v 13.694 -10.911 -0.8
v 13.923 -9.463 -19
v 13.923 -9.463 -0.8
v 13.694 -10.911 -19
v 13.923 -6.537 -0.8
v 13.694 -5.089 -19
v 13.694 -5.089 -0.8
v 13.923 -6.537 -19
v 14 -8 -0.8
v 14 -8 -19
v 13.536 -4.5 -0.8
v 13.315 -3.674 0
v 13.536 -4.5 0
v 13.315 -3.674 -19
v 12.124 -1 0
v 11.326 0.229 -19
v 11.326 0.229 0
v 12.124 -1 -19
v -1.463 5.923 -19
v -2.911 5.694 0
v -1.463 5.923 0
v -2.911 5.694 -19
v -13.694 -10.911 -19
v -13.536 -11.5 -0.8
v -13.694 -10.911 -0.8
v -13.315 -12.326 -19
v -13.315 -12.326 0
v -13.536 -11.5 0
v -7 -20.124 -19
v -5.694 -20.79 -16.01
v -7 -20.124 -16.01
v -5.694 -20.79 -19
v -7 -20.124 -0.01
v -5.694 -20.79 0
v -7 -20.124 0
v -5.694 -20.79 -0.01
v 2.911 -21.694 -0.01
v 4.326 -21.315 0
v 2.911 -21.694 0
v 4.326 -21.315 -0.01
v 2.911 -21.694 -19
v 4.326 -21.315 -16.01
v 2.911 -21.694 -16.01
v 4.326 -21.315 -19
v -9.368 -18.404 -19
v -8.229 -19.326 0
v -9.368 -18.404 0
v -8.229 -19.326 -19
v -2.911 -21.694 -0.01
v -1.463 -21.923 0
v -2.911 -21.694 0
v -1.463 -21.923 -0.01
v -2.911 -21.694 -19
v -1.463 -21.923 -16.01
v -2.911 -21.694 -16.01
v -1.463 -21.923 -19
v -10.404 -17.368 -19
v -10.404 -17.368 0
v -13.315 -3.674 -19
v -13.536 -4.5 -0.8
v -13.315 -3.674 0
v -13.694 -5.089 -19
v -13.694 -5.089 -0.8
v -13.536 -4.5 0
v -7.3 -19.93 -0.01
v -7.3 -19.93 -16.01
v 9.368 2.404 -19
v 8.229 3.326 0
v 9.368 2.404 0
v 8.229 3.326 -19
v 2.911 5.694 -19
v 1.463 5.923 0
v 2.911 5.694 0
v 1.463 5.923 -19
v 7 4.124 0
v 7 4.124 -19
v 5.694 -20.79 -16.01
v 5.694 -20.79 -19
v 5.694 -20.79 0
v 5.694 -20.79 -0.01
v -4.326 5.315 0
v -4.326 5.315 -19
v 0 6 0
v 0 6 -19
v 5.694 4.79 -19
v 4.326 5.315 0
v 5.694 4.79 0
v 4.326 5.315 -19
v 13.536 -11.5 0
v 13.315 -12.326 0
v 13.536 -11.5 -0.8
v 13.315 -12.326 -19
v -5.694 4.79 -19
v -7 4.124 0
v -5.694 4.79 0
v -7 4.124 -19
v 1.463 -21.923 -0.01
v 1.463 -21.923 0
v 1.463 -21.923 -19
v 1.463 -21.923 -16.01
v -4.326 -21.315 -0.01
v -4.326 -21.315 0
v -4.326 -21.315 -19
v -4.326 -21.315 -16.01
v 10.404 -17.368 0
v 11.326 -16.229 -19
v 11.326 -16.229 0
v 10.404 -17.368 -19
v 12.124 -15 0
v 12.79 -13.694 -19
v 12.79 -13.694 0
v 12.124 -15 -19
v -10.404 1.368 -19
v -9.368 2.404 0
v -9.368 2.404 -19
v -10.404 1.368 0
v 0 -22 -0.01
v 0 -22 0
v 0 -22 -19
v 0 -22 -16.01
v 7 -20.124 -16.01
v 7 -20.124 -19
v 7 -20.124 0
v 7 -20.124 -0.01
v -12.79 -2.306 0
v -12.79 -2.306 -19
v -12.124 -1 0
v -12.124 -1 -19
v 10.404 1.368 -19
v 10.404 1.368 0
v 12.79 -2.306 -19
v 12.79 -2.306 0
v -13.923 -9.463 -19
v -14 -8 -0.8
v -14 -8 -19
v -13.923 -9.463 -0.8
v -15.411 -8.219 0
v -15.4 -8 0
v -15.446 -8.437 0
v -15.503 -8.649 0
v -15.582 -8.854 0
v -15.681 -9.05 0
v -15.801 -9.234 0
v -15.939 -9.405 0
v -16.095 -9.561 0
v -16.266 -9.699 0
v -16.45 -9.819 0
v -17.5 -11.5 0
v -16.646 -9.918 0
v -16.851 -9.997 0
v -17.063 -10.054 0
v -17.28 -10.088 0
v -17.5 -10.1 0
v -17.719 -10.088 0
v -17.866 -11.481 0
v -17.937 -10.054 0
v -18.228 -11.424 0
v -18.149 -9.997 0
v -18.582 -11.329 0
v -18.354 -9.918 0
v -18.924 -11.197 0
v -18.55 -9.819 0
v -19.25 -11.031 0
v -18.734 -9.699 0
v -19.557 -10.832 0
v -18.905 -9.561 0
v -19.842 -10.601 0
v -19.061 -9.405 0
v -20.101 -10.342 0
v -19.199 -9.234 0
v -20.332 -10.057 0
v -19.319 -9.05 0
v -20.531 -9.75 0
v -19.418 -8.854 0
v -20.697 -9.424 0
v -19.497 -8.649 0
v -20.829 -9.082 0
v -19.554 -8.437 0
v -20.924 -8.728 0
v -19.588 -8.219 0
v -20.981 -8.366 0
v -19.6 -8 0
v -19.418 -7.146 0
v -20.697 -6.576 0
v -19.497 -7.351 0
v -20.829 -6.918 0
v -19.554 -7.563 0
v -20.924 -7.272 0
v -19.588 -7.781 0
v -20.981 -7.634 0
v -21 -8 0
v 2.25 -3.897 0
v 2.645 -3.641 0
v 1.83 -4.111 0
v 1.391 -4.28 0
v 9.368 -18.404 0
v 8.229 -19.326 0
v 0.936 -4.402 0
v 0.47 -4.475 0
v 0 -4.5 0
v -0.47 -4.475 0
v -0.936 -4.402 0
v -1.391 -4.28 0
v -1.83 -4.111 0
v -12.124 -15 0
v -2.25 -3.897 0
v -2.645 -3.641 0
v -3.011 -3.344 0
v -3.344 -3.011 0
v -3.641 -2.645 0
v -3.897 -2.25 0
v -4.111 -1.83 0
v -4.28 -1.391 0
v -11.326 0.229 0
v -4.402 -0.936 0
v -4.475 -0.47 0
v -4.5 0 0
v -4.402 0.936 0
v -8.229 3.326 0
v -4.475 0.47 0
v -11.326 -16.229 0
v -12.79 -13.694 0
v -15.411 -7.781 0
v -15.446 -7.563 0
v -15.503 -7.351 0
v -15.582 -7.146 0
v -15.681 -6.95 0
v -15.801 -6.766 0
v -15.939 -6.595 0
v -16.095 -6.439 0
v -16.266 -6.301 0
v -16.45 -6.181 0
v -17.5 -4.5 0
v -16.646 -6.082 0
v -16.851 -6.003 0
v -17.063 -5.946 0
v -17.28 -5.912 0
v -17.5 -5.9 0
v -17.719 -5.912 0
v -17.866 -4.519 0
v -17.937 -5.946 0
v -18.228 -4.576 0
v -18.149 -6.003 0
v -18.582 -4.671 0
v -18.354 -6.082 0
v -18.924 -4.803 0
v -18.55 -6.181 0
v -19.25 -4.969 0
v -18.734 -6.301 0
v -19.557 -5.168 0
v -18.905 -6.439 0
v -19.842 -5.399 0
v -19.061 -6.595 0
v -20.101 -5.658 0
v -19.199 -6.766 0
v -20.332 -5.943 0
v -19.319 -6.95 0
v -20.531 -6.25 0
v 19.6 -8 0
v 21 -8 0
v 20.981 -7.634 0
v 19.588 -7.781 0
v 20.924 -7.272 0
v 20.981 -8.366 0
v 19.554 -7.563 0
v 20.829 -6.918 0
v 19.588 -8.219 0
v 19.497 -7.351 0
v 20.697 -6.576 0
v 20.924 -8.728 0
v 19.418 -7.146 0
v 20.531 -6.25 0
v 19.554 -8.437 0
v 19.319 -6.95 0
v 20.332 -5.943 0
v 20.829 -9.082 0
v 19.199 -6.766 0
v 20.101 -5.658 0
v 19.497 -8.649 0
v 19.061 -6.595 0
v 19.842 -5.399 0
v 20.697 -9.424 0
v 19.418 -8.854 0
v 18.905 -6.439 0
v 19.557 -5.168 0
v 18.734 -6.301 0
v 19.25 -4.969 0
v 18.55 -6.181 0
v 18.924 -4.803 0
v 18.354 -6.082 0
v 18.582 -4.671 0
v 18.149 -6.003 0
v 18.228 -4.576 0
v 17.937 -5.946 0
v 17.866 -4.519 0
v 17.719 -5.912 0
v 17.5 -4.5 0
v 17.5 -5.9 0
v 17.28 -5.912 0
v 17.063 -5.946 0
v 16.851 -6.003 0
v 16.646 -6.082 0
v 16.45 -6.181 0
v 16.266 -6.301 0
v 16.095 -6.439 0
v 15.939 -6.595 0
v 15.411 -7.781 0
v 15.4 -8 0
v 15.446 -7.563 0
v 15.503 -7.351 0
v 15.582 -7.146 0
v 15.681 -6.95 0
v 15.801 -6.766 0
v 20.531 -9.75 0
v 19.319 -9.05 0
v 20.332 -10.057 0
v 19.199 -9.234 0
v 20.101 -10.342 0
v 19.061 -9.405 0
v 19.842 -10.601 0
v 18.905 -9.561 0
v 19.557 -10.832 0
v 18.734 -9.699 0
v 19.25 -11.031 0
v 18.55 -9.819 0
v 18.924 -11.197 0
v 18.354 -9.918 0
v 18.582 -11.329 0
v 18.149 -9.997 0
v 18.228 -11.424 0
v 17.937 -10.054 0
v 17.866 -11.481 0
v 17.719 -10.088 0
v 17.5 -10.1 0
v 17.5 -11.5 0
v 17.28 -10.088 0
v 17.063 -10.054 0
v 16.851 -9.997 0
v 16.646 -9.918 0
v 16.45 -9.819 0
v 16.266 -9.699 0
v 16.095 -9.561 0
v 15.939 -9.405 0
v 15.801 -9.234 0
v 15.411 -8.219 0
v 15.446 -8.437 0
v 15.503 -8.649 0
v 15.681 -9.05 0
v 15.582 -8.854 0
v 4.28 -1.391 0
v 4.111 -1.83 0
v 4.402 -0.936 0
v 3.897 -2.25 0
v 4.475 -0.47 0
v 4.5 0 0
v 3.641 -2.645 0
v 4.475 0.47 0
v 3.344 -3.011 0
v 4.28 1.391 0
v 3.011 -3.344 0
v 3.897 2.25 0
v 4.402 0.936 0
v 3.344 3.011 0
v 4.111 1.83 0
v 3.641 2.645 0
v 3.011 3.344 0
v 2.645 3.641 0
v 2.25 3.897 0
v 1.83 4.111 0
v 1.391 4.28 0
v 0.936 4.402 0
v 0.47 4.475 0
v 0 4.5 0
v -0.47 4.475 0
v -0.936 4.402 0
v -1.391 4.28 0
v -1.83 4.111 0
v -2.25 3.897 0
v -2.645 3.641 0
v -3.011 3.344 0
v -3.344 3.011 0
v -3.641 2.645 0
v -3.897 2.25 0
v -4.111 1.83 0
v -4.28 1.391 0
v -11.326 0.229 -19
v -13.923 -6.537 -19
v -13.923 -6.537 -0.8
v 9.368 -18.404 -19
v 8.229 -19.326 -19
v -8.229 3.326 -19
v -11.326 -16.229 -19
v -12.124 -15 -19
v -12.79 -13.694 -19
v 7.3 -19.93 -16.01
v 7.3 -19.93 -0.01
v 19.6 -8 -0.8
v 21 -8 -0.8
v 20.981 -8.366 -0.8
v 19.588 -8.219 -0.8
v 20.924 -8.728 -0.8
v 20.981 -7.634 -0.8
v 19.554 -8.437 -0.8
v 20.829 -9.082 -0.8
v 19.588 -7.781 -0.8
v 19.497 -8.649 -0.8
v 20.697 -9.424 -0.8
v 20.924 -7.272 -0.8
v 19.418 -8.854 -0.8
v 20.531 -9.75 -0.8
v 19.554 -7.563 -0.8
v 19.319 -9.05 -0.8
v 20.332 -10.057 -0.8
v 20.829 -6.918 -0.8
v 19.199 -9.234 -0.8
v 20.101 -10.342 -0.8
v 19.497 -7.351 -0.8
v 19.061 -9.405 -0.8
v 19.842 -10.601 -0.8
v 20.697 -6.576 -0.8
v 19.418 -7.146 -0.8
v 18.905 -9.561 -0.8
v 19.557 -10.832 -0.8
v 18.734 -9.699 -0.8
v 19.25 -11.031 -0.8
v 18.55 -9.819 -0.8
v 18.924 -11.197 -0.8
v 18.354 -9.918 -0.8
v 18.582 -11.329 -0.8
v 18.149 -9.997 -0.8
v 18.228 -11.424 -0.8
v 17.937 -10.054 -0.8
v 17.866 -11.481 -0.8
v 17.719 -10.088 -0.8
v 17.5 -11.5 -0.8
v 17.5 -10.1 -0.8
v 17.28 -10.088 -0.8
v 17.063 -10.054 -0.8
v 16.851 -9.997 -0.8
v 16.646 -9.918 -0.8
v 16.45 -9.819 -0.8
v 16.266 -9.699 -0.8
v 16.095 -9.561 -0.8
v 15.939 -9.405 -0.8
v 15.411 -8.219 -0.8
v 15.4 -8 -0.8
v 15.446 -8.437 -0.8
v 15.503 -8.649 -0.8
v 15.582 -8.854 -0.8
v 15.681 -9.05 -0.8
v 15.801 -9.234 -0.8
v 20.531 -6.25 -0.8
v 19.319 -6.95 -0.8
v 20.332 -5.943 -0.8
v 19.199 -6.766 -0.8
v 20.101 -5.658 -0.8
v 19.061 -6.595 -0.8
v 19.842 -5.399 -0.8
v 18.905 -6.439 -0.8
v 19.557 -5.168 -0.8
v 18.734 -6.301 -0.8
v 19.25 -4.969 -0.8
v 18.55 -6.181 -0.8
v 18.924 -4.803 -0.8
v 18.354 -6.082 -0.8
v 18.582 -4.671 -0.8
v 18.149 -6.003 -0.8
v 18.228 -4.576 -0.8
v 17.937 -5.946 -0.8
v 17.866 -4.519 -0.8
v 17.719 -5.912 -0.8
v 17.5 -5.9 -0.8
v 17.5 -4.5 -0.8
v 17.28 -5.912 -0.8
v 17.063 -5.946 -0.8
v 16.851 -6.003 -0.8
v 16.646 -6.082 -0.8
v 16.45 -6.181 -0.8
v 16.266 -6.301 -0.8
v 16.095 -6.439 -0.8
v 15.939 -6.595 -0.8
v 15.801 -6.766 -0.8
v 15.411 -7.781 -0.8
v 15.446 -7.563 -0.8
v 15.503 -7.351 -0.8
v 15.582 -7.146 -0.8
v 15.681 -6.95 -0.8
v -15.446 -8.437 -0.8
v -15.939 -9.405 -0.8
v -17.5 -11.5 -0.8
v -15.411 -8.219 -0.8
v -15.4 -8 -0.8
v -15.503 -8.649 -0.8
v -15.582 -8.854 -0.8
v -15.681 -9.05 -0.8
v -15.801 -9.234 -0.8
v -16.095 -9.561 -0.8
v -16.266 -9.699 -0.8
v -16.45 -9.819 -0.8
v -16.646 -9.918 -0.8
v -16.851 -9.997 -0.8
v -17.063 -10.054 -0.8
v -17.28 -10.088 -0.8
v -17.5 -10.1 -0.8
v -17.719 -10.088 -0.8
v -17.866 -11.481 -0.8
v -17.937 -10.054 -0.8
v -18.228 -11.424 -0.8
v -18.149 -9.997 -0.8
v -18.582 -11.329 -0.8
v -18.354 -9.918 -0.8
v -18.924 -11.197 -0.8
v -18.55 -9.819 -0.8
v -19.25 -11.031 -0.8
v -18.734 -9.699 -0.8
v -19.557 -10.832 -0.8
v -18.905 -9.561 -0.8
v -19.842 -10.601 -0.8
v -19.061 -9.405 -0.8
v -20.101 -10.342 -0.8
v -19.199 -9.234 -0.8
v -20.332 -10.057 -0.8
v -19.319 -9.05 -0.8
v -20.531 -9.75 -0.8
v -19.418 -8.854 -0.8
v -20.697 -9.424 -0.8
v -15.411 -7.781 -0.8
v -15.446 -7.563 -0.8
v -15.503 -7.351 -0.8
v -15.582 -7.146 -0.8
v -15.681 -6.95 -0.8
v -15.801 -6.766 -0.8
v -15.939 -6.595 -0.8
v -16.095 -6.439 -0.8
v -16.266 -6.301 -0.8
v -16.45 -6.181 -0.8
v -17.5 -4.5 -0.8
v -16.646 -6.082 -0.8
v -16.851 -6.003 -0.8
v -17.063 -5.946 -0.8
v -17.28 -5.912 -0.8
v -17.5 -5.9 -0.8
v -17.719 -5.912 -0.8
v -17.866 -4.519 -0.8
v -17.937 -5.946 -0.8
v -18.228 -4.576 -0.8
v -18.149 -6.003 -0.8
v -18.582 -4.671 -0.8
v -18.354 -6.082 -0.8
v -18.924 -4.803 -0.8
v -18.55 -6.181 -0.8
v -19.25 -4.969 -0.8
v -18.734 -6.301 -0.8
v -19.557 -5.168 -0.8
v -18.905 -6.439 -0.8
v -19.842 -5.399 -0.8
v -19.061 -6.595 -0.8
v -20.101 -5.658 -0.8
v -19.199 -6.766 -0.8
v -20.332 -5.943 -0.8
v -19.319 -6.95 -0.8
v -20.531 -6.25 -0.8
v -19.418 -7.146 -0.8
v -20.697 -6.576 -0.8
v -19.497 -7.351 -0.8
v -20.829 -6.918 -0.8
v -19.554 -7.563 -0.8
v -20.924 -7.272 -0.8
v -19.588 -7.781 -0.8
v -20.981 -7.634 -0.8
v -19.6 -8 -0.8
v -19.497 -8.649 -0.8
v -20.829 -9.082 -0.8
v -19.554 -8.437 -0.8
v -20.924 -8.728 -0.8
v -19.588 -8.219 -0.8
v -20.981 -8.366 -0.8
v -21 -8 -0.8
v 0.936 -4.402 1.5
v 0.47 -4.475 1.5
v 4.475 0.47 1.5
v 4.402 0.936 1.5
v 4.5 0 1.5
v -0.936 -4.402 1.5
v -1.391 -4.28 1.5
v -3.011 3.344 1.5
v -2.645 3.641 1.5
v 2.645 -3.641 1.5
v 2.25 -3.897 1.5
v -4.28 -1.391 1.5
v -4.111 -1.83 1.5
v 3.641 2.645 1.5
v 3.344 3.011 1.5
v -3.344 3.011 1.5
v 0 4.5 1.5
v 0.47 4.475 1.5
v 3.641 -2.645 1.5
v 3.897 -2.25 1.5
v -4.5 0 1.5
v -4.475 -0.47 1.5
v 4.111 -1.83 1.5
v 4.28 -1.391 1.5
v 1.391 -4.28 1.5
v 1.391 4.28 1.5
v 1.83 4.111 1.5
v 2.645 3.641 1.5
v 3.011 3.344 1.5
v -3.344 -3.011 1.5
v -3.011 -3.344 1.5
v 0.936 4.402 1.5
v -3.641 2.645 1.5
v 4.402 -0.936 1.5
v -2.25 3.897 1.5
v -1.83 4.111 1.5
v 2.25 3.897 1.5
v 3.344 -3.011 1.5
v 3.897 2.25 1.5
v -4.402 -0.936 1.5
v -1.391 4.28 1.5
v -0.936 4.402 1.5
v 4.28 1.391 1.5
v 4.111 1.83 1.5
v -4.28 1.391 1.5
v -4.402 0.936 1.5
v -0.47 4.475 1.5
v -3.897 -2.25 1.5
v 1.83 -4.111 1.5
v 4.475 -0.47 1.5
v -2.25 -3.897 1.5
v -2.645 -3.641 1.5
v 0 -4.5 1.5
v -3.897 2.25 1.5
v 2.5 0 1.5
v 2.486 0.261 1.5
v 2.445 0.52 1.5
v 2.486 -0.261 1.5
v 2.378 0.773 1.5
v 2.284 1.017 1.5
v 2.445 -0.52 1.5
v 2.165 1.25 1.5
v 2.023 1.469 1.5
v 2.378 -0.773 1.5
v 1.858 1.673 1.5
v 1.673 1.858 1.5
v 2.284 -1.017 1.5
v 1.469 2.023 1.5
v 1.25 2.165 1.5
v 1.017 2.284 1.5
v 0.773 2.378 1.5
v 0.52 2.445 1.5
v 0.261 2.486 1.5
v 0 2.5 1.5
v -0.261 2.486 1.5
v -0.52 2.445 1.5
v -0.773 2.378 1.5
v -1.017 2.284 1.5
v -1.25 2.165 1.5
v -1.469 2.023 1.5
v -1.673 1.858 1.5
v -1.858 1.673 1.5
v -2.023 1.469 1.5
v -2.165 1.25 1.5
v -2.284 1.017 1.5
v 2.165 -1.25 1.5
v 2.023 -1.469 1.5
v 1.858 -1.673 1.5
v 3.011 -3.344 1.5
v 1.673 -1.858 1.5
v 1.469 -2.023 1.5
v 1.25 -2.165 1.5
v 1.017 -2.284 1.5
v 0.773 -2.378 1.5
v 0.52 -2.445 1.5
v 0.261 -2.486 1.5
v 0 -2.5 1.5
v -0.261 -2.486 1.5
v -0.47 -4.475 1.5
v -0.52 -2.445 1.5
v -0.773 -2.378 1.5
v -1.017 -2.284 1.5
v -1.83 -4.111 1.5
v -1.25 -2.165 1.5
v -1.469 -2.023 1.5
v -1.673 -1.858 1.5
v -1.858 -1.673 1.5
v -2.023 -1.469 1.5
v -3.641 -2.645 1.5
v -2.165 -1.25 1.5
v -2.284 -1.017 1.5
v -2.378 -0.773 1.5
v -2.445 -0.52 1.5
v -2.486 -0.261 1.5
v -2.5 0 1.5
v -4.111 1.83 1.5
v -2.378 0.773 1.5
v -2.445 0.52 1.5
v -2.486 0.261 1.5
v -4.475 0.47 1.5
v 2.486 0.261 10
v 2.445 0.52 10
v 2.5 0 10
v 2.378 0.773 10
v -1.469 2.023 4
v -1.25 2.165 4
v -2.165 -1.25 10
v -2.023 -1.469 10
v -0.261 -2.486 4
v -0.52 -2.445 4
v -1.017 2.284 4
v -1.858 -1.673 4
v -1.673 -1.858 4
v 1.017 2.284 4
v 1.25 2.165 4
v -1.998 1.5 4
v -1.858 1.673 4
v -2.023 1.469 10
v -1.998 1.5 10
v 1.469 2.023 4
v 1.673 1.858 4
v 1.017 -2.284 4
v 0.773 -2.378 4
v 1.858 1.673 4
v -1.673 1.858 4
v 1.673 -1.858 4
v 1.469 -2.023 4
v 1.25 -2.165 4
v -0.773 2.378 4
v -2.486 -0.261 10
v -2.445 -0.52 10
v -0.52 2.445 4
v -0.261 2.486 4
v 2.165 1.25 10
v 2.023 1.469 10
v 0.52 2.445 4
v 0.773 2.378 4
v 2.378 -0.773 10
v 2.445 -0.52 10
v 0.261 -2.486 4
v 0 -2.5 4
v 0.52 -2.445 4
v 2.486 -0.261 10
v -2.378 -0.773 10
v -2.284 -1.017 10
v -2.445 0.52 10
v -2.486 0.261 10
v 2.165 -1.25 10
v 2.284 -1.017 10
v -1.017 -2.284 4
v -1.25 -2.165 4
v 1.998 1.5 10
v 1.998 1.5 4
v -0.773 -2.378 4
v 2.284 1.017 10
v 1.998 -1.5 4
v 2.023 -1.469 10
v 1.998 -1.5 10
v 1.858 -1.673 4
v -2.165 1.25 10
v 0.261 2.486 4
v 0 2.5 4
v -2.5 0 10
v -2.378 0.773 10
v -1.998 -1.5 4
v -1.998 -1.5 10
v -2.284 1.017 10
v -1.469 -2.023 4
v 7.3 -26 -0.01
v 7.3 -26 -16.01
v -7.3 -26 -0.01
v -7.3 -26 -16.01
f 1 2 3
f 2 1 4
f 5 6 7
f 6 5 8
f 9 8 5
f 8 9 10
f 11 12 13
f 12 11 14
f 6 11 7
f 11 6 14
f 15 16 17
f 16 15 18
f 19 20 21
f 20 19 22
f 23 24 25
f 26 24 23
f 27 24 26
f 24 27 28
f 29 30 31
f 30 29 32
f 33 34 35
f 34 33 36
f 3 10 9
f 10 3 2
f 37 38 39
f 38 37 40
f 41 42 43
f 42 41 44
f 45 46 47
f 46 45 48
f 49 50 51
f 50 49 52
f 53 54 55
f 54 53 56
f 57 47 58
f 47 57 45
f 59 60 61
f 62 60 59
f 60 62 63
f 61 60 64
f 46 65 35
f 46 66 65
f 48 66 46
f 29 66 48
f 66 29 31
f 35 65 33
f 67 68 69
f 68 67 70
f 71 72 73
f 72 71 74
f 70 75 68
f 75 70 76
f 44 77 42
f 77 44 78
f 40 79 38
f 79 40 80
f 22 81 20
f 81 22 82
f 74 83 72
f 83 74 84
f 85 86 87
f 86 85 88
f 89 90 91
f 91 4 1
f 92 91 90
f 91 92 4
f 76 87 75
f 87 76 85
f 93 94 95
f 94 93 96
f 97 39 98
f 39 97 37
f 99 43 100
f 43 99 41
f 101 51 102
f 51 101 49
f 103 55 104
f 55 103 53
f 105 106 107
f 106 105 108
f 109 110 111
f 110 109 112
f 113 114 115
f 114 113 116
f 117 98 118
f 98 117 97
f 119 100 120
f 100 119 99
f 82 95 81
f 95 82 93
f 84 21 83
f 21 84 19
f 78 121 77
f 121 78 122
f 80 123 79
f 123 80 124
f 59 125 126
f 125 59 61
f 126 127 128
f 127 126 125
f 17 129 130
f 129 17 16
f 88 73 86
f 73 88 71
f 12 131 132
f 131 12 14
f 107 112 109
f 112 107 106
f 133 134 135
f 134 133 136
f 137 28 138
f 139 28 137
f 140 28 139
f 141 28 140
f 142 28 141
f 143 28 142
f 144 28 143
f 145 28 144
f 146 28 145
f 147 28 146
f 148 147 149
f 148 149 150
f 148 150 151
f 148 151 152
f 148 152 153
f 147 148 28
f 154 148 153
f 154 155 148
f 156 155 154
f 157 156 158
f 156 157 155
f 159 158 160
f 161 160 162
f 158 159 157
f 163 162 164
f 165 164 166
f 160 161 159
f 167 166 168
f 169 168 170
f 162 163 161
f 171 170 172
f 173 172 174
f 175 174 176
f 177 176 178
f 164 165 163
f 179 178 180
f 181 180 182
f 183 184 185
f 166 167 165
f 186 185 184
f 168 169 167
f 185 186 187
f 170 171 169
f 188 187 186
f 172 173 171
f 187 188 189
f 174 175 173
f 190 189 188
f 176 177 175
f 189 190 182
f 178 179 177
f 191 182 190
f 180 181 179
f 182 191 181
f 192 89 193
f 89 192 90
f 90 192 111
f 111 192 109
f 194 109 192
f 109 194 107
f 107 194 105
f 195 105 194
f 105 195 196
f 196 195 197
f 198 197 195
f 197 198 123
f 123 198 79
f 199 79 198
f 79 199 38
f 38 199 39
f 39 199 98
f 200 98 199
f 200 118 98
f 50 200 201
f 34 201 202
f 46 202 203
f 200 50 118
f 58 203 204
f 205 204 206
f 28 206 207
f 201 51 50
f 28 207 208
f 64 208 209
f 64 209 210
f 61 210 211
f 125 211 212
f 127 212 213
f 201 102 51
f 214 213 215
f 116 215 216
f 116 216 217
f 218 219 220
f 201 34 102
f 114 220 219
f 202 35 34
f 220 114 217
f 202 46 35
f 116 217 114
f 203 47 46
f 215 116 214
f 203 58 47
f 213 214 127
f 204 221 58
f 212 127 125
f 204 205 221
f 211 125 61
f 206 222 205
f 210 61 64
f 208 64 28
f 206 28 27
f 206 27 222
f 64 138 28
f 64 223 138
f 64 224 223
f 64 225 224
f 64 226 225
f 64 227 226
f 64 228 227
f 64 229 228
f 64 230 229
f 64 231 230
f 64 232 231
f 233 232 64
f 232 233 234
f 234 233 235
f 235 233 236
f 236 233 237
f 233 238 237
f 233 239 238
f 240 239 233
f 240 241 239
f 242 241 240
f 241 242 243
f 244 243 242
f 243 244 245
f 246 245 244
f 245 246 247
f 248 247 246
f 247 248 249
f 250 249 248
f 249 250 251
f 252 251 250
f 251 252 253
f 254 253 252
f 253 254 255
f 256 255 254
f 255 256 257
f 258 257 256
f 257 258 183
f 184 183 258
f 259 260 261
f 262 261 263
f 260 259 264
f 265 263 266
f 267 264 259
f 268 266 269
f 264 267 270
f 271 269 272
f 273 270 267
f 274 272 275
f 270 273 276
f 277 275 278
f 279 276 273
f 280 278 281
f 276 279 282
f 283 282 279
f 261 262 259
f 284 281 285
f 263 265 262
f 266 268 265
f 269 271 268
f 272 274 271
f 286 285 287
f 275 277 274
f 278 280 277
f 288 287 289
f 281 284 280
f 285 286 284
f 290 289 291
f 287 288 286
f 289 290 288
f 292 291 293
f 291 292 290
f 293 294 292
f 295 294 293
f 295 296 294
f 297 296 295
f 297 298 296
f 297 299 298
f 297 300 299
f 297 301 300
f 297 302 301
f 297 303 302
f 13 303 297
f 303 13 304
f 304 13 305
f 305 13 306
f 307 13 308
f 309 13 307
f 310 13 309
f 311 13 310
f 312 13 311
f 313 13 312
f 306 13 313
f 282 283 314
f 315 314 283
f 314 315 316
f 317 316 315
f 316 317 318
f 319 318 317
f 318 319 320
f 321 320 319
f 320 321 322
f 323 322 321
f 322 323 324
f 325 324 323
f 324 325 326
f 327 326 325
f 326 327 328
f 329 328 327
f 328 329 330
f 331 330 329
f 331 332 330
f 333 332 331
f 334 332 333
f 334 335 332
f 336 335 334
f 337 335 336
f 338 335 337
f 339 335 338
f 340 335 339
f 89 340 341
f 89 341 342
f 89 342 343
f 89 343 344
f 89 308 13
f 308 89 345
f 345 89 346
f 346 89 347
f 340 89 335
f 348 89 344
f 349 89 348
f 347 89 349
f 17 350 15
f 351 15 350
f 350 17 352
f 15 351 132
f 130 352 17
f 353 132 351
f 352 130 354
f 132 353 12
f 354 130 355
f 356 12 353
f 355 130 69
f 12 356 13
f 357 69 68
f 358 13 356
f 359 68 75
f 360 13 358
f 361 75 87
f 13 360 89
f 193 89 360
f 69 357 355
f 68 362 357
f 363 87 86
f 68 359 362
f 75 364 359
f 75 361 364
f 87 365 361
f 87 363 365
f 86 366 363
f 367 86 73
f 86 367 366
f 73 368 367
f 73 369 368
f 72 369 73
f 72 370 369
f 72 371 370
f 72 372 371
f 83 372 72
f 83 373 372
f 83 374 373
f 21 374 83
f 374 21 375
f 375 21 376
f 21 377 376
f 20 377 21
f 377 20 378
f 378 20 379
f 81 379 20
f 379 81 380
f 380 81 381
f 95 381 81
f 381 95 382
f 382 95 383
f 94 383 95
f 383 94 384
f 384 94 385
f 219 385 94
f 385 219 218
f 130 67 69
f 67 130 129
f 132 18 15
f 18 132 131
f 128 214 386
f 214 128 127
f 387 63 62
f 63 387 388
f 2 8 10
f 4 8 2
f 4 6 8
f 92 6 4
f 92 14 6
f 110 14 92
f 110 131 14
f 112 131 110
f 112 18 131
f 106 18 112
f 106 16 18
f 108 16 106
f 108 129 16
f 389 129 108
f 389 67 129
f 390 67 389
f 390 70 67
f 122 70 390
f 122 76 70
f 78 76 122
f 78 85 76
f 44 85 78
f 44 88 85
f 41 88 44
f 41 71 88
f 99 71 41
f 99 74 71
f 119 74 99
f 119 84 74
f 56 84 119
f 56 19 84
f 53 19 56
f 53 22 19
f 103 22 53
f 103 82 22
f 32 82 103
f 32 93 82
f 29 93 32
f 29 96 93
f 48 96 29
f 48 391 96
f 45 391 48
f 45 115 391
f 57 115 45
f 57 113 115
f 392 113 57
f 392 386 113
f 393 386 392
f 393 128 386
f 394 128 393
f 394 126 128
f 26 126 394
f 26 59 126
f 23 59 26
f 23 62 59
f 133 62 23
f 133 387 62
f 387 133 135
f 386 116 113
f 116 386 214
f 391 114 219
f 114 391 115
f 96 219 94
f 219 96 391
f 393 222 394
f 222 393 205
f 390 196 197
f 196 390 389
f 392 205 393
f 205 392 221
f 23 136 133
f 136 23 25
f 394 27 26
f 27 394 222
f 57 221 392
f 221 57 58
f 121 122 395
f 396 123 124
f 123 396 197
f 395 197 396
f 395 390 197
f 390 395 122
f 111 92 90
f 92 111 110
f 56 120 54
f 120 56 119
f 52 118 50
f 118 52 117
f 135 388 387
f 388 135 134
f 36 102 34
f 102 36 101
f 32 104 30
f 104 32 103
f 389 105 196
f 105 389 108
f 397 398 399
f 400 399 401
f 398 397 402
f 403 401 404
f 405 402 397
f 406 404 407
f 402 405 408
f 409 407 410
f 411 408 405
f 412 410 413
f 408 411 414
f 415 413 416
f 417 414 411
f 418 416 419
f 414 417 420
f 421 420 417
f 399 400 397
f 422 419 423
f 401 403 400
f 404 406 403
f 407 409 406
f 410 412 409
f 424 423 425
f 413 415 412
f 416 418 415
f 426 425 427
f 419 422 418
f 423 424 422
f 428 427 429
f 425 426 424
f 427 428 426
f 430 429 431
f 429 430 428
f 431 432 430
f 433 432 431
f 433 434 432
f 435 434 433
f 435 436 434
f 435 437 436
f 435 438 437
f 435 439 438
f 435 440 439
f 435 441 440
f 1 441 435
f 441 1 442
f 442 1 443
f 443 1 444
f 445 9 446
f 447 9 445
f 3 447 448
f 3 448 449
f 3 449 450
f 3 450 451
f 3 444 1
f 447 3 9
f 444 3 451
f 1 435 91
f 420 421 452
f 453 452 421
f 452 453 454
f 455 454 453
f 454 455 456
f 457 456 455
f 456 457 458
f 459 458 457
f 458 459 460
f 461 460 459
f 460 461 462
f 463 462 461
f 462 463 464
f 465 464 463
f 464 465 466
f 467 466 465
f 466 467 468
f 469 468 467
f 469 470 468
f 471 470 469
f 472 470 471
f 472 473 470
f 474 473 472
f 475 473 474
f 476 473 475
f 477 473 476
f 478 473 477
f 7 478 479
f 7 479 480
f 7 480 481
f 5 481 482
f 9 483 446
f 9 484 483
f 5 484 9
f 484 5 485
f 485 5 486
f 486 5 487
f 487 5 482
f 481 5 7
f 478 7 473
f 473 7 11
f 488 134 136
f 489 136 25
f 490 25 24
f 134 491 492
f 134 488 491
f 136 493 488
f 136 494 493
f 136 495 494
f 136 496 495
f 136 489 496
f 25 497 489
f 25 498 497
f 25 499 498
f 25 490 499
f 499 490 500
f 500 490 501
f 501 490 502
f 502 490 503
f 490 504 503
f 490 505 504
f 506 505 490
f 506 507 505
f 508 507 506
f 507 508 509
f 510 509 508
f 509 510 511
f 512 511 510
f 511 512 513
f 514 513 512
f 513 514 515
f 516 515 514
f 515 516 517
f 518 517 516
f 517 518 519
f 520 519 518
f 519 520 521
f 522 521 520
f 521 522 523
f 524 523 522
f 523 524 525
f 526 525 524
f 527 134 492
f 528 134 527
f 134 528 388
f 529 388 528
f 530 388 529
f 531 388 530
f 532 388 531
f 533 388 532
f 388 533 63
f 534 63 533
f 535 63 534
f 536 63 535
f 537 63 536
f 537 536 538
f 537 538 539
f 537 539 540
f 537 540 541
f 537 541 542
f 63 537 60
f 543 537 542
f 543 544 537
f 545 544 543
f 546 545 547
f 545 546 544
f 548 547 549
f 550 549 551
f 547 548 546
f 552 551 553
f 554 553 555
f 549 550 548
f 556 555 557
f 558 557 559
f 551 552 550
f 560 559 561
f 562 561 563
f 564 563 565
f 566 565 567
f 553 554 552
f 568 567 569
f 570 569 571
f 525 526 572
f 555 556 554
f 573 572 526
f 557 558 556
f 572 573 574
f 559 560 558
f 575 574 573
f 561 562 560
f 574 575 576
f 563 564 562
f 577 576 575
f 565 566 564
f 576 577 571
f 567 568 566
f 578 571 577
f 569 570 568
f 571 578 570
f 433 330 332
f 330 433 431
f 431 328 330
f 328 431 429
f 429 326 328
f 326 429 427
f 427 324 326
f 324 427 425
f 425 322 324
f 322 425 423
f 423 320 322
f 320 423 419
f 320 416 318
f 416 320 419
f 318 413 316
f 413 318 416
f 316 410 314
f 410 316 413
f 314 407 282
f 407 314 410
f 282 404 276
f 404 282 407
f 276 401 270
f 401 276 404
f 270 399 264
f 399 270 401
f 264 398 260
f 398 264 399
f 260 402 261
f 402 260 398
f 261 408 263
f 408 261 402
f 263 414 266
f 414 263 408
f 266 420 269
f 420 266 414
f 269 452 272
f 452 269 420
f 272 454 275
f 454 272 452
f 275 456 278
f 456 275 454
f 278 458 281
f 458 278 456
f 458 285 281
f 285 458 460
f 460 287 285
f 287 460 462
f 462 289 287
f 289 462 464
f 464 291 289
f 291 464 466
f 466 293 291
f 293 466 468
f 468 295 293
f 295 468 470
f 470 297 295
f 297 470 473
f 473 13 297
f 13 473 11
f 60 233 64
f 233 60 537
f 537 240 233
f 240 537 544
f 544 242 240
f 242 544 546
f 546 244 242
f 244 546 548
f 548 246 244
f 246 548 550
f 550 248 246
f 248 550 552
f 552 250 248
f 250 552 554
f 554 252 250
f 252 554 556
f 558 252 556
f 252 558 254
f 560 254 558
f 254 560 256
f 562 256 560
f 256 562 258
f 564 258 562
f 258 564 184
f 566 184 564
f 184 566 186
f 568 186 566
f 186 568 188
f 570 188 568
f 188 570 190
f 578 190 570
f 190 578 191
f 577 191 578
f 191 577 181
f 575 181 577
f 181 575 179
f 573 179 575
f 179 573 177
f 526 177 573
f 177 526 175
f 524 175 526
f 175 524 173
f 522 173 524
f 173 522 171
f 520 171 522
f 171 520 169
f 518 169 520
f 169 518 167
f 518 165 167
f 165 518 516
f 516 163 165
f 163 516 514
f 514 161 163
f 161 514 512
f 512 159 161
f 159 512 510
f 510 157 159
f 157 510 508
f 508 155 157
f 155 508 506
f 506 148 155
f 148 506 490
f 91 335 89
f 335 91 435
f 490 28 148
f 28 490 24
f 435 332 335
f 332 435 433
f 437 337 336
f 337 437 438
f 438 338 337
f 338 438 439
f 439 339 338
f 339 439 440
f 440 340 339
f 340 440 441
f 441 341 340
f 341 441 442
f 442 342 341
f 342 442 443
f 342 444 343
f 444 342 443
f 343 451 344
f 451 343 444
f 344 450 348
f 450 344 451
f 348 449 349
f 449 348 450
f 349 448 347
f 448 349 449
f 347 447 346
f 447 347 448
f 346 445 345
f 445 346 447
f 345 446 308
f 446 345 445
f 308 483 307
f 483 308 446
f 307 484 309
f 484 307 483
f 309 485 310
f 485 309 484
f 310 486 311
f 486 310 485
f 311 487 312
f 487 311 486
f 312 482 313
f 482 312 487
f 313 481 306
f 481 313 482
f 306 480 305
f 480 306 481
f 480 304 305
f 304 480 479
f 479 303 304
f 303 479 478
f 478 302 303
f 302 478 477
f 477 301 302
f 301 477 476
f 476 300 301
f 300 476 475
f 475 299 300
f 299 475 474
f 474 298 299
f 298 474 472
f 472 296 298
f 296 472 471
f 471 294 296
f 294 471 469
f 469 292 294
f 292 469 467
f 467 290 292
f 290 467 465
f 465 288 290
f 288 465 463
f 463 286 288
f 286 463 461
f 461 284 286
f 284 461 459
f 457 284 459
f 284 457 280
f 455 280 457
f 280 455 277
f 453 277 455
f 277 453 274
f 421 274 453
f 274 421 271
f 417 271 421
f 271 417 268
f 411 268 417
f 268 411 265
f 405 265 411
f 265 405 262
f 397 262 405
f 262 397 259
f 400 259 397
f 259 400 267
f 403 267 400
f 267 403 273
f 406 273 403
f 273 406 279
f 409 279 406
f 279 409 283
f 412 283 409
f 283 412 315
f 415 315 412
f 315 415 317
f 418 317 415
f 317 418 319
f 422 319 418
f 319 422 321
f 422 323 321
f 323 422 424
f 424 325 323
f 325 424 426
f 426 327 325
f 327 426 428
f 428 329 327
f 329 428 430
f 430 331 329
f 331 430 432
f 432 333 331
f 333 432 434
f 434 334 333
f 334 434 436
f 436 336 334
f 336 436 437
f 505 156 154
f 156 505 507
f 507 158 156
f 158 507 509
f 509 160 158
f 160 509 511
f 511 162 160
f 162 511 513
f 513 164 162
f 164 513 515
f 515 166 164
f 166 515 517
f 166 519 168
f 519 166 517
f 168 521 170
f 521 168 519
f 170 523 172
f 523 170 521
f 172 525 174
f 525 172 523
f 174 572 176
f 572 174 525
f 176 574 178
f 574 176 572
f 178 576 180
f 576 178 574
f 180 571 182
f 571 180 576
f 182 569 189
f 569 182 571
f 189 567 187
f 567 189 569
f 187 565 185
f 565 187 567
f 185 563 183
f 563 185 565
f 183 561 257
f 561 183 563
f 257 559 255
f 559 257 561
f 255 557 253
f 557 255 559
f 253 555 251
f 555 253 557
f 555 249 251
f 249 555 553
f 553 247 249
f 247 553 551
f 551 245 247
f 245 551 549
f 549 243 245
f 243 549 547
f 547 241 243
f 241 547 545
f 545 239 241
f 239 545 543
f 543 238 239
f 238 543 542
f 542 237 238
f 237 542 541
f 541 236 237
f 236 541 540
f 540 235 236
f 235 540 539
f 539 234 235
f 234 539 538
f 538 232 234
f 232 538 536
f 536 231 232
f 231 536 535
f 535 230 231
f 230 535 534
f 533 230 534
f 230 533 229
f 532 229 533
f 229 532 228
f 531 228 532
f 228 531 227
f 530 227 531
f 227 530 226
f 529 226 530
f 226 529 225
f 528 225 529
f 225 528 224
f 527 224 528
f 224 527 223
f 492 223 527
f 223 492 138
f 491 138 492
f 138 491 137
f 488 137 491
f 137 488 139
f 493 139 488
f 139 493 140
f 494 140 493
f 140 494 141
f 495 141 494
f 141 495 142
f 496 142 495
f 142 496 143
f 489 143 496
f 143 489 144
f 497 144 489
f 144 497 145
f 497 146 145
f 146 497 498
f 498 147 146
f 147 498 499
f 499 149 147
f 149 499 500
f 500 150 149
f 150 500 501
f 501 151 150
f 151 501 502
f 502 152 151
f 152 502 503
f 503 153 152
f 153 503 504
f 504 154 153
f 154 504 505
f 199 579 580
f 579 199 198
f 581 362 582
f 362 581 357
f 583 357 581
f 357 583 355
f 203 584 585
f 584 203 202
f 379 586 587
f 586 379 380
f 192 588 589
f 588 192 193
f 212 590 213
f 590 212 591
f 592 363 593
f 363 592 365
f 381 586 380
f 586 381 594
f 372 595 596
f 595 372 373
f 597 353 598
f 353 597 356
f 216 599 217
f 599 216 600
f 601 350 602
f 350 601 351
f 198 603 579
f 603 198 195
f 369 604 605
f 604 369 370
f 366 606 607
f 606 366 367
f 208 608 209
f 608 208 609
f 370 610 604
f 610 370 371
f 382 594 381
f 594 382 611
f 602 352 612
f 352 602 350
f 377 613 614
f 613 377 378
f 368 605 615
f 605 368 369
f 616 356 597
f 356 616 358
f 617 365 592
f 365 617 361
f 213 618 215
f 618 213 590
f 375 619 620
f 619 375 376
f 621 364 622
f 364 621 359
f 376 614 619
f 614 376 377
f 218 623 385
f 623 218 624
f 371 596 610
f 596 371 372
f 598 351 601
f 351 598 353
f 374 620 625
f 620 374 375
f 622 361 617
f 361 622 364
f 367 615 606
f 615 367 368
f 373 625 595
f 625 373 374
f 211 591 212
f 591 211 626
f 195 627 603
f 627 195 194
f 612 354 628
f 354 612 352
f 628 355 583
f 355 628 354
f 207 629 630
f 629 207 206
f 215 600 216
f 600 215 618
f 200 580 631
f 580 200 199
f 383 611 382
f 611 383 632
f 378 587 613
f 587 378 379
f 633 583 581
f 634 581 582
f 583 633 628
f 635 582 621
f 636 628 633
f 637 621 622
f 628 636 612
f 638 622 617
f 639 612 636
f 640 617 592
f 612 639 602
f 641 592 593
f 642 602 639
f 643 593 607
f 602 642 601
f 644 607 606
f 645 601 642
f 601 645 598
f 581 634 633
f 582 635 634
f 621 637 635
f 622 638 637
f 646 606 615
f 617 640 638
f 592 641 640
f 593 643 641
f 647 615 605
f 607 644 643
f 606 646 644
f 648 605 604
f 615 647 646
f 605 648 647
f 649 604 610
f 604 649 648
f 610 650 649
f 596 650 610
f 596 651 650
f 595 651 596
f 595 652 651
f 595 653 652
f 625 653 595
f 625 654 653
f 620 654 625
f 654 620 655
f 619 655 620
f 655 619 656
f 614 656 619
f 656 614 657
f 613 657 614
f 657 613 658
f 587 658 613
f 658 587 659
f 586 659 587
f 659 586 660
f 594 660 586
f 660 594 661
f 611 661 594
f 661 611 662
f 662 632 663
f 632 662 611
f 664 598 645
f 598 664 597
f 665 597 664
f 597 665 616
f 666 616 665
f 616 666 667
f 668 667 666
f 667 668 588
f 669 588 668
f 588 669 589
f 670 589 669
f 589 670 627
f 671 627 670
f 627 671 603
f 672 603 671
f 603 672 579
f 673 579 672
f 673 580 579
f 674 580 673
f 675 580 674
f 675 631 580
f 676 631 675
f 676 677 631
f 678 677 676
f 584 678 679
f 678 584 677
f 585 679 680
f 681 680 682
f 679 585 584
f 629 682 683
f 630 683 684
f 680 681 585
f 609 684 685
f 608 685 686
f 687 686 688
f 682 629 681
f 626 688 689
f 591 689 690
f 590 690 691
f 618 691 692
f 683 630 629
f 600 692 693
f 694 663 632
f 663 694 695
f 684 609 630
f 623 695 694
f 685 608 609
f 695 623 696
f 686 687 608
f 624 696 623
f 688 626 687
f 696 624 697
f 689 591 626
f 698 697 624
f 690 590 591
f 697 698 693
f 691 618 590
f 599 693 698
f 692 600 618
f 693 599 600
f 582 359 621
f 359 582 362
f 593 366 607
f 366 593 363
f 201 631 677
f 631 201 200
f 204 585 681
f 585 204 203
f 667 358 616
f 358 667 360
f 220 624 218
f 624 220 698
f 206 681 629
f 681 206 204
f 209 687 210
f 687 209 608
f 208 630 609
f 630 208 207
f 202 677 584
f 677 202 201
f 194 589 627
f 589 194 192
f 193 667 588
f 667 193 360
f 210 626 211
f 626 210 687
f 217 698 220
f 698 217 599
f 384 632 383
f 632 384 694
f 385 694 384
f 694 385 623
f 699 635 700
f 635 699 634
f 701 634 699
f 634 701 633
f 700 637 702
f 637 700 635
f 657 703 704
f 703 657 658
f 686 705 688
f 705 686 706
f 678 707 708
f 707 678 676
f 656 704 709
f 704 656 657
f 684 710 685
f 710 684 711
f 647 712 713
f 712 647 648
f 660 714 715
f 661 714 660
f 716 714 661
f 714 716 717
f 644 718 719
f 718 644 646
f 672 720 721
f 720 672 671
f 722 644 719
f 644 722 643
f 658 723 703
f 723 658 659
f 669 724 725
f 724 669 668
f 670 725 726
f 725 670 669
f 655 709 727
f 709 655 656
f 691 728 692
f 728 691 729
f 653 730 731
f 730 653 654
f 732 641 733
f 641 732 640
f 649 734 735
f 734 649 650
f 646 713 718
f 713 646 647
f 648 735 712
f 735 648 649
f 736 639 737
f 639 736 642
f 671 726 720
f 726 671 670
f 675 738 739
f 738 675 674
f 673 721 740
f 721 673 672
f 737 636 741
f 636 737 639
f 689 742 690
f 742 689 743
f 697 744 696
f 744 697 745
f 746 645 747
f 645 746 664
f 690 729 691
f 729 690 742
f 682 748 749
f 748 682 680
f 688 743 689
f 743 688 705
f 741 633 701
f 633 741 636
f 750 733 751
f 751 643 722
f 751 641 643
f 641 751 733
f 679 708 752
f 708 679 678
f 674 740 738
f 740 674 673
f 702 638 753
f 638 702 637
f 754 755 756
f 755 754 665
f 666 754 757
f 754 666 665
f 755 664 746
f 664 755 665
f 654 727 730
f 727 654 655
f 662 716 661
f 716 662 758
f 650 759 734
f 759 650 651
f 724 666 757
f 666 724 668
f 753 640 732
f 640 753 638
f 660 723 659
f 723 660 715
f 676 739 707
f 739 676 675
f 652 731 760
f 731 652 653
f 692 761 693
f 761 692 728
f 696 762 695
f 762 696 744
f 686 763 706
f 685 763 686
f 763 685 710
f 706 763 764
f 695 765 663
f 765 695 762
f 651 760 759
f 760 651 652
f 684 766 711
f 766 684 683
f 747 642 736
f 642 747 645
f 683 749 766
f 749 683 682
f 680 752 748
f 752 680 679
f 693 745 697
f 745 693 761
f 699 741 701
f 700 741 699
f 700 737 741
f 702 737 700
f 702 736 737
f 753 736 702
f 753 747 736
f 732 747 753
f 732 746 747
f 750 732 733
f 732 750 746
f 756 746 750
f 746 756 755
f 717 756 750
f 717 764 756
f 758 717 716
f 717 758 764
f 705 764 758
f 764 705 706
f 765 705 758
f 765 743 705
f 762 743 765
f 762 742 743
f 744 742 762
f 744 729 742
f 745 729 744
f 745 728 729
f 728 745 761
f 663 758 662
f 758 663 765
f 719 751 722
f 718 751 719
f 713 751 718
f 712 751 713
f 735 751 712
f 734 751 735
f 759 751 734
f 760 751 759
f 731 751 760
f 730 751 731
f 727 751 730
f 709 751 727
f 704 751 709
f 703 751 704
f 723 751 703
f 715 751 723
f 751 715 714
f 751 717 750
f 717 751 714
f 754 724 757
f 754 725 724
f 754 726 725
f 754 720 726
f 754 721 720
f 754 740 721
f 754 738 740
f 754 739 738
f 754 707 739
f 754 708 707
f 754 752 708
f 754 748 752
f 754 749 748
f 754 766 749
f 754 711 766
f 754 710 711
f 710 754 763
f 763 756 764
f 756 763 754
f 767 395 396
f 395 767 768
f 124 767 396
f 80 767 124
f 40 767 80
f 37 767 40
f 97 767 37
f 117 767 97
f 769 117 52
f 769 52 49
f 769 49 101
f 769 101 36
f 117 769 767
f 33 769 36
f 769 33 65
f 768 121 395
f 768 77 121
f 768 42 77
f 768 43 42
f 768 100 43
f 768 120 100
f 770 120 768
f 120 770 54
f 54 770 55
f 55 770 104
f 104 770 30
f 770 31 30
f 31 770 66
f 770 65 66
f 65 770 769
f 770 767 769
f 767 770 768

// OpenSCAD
// SPDX-FileCopyrightText: 2015-2016 Scott Bezek and the splitflap contributors
// SPDX-License-Identifier: Apache-2.0
/*
   Copyright 2015-2016 Scott Bezek and the splitflap contributors

   Licensed under the Apache License, Version 2.0 (the "License");
   you may not use this file except in compliance with the License.
   You may obtain a copy of the License at

       http://www.apache.org/licenses/LICENSE-2.0

   Unless required by applicable law or agreed to in writing, software
   distributed under the License is distributed on an "AS IS" BASIS,
   WITHOUT WARRANTIES OR CONDITIONS OF ANY KIND, either express or implied.
   See the License for the specific language governing permissions and
   limitations under the License.
*/

// Basic 28BYJ-48 model based on various dimensioned drawings.
// Origin is centered on the shaft, on the front face of the motor, with the shaft in the +z direction
module Stepper28BYJ48() {
    $fn = 60;

    eps = 0.01;
    chassis_radius = 28/2;
    chassis_height = 19;
    shaft_offset = 8;
    mount_outer_radius = 3.5;
    mount_hole_radius = 4.2/2;
    mount_center_offset = 35/2;
    mount_bracket_height = 0.8;

    shaft_collar_radius = 9/2;
    shaft_collar_height = 1.5;

    shaft_radius = 5/2;
    shaft_height = 10;
    shaft_slotted_width = 3;
    shaft_slotted_height = 6;

    backpack_width = 14.6;
    backpack_extent = 18; // seen values from 17-18
    backpack_height = 16;

    gray = [0.7, 0.7, 0.7];
    gold = [1, 0.843, 0];
    blue = [0, 0, 1];

    module mounting_holes() {
        linear_extrude(height=mount_bracket_height) {
        difference() {
            hull() {
                translate([mount_center_offset, 0]) {
                    circle(r=mount_outer_radius);
                }
                translate([-mount_center_offset, 0]) {
                    circle(r=mount_outer_radius);
                }
            }

            translate([mount_center_offset, 0]) {
                circle(r=mount_hole_radius);
            }
            translate([-mount_center_offset, 0]) {
                circle(r=mount_hole_radius);
            }
        }
        }
    }

    module shaft_collar() {
        cylinder(r=shaft_collar_radius, h=shaft_collar_height + eps);
    }

    module shaft() {
        color(gold) {
            difference() {
                cylinder(r=shaft_radius, h=shaft_height);
                translate([-(shaft_radius + eps), shaft_slotted_width / 2, shaft_height - shaft_slotted_height]) {
                    cube([(shaft_radius+eps)*2, shaft_radius, shaft_slotted_height+eps]);
                }
                translate([-(shaft_radius + eps), - shaft_radius - (shaft_slotted_width / 2), shaft_height - shaft_slotted_height]) {
                    cube([(shaft_radius+eps)*2, shaft_radius, shaft_slotted_height+eps]);
                }
            }
        }
    }

    module chassis() {
        color(gray) {
            translate([0, 0, -chassis_height]) {
                cylinder(r=chassis_radius, h=chassis_height);
            }
            translate([0, 0, -mount_bracket_height]) {
                mounting_holes();
            }
            translate([0, shaft_offset, -eps]) {
                shaft_collar();
            }
        }
    }

    module backpack() {
        color(blue) {
            translate([-backpack_width/2, 0, -backpack_height - eps]) {
                cube([backpack_width, backpack_extent, backpack_height]);
            }
        }
    }

    translate([0, -shaft_offset, 0]) {
        chassis();
        translate([0, shaft_offset, 0]) {
            shaft();
        }
        translate([0, -backpack_extent, 0]) {
            backpack();
        }
    }
}

Stepper28BYJ48();
